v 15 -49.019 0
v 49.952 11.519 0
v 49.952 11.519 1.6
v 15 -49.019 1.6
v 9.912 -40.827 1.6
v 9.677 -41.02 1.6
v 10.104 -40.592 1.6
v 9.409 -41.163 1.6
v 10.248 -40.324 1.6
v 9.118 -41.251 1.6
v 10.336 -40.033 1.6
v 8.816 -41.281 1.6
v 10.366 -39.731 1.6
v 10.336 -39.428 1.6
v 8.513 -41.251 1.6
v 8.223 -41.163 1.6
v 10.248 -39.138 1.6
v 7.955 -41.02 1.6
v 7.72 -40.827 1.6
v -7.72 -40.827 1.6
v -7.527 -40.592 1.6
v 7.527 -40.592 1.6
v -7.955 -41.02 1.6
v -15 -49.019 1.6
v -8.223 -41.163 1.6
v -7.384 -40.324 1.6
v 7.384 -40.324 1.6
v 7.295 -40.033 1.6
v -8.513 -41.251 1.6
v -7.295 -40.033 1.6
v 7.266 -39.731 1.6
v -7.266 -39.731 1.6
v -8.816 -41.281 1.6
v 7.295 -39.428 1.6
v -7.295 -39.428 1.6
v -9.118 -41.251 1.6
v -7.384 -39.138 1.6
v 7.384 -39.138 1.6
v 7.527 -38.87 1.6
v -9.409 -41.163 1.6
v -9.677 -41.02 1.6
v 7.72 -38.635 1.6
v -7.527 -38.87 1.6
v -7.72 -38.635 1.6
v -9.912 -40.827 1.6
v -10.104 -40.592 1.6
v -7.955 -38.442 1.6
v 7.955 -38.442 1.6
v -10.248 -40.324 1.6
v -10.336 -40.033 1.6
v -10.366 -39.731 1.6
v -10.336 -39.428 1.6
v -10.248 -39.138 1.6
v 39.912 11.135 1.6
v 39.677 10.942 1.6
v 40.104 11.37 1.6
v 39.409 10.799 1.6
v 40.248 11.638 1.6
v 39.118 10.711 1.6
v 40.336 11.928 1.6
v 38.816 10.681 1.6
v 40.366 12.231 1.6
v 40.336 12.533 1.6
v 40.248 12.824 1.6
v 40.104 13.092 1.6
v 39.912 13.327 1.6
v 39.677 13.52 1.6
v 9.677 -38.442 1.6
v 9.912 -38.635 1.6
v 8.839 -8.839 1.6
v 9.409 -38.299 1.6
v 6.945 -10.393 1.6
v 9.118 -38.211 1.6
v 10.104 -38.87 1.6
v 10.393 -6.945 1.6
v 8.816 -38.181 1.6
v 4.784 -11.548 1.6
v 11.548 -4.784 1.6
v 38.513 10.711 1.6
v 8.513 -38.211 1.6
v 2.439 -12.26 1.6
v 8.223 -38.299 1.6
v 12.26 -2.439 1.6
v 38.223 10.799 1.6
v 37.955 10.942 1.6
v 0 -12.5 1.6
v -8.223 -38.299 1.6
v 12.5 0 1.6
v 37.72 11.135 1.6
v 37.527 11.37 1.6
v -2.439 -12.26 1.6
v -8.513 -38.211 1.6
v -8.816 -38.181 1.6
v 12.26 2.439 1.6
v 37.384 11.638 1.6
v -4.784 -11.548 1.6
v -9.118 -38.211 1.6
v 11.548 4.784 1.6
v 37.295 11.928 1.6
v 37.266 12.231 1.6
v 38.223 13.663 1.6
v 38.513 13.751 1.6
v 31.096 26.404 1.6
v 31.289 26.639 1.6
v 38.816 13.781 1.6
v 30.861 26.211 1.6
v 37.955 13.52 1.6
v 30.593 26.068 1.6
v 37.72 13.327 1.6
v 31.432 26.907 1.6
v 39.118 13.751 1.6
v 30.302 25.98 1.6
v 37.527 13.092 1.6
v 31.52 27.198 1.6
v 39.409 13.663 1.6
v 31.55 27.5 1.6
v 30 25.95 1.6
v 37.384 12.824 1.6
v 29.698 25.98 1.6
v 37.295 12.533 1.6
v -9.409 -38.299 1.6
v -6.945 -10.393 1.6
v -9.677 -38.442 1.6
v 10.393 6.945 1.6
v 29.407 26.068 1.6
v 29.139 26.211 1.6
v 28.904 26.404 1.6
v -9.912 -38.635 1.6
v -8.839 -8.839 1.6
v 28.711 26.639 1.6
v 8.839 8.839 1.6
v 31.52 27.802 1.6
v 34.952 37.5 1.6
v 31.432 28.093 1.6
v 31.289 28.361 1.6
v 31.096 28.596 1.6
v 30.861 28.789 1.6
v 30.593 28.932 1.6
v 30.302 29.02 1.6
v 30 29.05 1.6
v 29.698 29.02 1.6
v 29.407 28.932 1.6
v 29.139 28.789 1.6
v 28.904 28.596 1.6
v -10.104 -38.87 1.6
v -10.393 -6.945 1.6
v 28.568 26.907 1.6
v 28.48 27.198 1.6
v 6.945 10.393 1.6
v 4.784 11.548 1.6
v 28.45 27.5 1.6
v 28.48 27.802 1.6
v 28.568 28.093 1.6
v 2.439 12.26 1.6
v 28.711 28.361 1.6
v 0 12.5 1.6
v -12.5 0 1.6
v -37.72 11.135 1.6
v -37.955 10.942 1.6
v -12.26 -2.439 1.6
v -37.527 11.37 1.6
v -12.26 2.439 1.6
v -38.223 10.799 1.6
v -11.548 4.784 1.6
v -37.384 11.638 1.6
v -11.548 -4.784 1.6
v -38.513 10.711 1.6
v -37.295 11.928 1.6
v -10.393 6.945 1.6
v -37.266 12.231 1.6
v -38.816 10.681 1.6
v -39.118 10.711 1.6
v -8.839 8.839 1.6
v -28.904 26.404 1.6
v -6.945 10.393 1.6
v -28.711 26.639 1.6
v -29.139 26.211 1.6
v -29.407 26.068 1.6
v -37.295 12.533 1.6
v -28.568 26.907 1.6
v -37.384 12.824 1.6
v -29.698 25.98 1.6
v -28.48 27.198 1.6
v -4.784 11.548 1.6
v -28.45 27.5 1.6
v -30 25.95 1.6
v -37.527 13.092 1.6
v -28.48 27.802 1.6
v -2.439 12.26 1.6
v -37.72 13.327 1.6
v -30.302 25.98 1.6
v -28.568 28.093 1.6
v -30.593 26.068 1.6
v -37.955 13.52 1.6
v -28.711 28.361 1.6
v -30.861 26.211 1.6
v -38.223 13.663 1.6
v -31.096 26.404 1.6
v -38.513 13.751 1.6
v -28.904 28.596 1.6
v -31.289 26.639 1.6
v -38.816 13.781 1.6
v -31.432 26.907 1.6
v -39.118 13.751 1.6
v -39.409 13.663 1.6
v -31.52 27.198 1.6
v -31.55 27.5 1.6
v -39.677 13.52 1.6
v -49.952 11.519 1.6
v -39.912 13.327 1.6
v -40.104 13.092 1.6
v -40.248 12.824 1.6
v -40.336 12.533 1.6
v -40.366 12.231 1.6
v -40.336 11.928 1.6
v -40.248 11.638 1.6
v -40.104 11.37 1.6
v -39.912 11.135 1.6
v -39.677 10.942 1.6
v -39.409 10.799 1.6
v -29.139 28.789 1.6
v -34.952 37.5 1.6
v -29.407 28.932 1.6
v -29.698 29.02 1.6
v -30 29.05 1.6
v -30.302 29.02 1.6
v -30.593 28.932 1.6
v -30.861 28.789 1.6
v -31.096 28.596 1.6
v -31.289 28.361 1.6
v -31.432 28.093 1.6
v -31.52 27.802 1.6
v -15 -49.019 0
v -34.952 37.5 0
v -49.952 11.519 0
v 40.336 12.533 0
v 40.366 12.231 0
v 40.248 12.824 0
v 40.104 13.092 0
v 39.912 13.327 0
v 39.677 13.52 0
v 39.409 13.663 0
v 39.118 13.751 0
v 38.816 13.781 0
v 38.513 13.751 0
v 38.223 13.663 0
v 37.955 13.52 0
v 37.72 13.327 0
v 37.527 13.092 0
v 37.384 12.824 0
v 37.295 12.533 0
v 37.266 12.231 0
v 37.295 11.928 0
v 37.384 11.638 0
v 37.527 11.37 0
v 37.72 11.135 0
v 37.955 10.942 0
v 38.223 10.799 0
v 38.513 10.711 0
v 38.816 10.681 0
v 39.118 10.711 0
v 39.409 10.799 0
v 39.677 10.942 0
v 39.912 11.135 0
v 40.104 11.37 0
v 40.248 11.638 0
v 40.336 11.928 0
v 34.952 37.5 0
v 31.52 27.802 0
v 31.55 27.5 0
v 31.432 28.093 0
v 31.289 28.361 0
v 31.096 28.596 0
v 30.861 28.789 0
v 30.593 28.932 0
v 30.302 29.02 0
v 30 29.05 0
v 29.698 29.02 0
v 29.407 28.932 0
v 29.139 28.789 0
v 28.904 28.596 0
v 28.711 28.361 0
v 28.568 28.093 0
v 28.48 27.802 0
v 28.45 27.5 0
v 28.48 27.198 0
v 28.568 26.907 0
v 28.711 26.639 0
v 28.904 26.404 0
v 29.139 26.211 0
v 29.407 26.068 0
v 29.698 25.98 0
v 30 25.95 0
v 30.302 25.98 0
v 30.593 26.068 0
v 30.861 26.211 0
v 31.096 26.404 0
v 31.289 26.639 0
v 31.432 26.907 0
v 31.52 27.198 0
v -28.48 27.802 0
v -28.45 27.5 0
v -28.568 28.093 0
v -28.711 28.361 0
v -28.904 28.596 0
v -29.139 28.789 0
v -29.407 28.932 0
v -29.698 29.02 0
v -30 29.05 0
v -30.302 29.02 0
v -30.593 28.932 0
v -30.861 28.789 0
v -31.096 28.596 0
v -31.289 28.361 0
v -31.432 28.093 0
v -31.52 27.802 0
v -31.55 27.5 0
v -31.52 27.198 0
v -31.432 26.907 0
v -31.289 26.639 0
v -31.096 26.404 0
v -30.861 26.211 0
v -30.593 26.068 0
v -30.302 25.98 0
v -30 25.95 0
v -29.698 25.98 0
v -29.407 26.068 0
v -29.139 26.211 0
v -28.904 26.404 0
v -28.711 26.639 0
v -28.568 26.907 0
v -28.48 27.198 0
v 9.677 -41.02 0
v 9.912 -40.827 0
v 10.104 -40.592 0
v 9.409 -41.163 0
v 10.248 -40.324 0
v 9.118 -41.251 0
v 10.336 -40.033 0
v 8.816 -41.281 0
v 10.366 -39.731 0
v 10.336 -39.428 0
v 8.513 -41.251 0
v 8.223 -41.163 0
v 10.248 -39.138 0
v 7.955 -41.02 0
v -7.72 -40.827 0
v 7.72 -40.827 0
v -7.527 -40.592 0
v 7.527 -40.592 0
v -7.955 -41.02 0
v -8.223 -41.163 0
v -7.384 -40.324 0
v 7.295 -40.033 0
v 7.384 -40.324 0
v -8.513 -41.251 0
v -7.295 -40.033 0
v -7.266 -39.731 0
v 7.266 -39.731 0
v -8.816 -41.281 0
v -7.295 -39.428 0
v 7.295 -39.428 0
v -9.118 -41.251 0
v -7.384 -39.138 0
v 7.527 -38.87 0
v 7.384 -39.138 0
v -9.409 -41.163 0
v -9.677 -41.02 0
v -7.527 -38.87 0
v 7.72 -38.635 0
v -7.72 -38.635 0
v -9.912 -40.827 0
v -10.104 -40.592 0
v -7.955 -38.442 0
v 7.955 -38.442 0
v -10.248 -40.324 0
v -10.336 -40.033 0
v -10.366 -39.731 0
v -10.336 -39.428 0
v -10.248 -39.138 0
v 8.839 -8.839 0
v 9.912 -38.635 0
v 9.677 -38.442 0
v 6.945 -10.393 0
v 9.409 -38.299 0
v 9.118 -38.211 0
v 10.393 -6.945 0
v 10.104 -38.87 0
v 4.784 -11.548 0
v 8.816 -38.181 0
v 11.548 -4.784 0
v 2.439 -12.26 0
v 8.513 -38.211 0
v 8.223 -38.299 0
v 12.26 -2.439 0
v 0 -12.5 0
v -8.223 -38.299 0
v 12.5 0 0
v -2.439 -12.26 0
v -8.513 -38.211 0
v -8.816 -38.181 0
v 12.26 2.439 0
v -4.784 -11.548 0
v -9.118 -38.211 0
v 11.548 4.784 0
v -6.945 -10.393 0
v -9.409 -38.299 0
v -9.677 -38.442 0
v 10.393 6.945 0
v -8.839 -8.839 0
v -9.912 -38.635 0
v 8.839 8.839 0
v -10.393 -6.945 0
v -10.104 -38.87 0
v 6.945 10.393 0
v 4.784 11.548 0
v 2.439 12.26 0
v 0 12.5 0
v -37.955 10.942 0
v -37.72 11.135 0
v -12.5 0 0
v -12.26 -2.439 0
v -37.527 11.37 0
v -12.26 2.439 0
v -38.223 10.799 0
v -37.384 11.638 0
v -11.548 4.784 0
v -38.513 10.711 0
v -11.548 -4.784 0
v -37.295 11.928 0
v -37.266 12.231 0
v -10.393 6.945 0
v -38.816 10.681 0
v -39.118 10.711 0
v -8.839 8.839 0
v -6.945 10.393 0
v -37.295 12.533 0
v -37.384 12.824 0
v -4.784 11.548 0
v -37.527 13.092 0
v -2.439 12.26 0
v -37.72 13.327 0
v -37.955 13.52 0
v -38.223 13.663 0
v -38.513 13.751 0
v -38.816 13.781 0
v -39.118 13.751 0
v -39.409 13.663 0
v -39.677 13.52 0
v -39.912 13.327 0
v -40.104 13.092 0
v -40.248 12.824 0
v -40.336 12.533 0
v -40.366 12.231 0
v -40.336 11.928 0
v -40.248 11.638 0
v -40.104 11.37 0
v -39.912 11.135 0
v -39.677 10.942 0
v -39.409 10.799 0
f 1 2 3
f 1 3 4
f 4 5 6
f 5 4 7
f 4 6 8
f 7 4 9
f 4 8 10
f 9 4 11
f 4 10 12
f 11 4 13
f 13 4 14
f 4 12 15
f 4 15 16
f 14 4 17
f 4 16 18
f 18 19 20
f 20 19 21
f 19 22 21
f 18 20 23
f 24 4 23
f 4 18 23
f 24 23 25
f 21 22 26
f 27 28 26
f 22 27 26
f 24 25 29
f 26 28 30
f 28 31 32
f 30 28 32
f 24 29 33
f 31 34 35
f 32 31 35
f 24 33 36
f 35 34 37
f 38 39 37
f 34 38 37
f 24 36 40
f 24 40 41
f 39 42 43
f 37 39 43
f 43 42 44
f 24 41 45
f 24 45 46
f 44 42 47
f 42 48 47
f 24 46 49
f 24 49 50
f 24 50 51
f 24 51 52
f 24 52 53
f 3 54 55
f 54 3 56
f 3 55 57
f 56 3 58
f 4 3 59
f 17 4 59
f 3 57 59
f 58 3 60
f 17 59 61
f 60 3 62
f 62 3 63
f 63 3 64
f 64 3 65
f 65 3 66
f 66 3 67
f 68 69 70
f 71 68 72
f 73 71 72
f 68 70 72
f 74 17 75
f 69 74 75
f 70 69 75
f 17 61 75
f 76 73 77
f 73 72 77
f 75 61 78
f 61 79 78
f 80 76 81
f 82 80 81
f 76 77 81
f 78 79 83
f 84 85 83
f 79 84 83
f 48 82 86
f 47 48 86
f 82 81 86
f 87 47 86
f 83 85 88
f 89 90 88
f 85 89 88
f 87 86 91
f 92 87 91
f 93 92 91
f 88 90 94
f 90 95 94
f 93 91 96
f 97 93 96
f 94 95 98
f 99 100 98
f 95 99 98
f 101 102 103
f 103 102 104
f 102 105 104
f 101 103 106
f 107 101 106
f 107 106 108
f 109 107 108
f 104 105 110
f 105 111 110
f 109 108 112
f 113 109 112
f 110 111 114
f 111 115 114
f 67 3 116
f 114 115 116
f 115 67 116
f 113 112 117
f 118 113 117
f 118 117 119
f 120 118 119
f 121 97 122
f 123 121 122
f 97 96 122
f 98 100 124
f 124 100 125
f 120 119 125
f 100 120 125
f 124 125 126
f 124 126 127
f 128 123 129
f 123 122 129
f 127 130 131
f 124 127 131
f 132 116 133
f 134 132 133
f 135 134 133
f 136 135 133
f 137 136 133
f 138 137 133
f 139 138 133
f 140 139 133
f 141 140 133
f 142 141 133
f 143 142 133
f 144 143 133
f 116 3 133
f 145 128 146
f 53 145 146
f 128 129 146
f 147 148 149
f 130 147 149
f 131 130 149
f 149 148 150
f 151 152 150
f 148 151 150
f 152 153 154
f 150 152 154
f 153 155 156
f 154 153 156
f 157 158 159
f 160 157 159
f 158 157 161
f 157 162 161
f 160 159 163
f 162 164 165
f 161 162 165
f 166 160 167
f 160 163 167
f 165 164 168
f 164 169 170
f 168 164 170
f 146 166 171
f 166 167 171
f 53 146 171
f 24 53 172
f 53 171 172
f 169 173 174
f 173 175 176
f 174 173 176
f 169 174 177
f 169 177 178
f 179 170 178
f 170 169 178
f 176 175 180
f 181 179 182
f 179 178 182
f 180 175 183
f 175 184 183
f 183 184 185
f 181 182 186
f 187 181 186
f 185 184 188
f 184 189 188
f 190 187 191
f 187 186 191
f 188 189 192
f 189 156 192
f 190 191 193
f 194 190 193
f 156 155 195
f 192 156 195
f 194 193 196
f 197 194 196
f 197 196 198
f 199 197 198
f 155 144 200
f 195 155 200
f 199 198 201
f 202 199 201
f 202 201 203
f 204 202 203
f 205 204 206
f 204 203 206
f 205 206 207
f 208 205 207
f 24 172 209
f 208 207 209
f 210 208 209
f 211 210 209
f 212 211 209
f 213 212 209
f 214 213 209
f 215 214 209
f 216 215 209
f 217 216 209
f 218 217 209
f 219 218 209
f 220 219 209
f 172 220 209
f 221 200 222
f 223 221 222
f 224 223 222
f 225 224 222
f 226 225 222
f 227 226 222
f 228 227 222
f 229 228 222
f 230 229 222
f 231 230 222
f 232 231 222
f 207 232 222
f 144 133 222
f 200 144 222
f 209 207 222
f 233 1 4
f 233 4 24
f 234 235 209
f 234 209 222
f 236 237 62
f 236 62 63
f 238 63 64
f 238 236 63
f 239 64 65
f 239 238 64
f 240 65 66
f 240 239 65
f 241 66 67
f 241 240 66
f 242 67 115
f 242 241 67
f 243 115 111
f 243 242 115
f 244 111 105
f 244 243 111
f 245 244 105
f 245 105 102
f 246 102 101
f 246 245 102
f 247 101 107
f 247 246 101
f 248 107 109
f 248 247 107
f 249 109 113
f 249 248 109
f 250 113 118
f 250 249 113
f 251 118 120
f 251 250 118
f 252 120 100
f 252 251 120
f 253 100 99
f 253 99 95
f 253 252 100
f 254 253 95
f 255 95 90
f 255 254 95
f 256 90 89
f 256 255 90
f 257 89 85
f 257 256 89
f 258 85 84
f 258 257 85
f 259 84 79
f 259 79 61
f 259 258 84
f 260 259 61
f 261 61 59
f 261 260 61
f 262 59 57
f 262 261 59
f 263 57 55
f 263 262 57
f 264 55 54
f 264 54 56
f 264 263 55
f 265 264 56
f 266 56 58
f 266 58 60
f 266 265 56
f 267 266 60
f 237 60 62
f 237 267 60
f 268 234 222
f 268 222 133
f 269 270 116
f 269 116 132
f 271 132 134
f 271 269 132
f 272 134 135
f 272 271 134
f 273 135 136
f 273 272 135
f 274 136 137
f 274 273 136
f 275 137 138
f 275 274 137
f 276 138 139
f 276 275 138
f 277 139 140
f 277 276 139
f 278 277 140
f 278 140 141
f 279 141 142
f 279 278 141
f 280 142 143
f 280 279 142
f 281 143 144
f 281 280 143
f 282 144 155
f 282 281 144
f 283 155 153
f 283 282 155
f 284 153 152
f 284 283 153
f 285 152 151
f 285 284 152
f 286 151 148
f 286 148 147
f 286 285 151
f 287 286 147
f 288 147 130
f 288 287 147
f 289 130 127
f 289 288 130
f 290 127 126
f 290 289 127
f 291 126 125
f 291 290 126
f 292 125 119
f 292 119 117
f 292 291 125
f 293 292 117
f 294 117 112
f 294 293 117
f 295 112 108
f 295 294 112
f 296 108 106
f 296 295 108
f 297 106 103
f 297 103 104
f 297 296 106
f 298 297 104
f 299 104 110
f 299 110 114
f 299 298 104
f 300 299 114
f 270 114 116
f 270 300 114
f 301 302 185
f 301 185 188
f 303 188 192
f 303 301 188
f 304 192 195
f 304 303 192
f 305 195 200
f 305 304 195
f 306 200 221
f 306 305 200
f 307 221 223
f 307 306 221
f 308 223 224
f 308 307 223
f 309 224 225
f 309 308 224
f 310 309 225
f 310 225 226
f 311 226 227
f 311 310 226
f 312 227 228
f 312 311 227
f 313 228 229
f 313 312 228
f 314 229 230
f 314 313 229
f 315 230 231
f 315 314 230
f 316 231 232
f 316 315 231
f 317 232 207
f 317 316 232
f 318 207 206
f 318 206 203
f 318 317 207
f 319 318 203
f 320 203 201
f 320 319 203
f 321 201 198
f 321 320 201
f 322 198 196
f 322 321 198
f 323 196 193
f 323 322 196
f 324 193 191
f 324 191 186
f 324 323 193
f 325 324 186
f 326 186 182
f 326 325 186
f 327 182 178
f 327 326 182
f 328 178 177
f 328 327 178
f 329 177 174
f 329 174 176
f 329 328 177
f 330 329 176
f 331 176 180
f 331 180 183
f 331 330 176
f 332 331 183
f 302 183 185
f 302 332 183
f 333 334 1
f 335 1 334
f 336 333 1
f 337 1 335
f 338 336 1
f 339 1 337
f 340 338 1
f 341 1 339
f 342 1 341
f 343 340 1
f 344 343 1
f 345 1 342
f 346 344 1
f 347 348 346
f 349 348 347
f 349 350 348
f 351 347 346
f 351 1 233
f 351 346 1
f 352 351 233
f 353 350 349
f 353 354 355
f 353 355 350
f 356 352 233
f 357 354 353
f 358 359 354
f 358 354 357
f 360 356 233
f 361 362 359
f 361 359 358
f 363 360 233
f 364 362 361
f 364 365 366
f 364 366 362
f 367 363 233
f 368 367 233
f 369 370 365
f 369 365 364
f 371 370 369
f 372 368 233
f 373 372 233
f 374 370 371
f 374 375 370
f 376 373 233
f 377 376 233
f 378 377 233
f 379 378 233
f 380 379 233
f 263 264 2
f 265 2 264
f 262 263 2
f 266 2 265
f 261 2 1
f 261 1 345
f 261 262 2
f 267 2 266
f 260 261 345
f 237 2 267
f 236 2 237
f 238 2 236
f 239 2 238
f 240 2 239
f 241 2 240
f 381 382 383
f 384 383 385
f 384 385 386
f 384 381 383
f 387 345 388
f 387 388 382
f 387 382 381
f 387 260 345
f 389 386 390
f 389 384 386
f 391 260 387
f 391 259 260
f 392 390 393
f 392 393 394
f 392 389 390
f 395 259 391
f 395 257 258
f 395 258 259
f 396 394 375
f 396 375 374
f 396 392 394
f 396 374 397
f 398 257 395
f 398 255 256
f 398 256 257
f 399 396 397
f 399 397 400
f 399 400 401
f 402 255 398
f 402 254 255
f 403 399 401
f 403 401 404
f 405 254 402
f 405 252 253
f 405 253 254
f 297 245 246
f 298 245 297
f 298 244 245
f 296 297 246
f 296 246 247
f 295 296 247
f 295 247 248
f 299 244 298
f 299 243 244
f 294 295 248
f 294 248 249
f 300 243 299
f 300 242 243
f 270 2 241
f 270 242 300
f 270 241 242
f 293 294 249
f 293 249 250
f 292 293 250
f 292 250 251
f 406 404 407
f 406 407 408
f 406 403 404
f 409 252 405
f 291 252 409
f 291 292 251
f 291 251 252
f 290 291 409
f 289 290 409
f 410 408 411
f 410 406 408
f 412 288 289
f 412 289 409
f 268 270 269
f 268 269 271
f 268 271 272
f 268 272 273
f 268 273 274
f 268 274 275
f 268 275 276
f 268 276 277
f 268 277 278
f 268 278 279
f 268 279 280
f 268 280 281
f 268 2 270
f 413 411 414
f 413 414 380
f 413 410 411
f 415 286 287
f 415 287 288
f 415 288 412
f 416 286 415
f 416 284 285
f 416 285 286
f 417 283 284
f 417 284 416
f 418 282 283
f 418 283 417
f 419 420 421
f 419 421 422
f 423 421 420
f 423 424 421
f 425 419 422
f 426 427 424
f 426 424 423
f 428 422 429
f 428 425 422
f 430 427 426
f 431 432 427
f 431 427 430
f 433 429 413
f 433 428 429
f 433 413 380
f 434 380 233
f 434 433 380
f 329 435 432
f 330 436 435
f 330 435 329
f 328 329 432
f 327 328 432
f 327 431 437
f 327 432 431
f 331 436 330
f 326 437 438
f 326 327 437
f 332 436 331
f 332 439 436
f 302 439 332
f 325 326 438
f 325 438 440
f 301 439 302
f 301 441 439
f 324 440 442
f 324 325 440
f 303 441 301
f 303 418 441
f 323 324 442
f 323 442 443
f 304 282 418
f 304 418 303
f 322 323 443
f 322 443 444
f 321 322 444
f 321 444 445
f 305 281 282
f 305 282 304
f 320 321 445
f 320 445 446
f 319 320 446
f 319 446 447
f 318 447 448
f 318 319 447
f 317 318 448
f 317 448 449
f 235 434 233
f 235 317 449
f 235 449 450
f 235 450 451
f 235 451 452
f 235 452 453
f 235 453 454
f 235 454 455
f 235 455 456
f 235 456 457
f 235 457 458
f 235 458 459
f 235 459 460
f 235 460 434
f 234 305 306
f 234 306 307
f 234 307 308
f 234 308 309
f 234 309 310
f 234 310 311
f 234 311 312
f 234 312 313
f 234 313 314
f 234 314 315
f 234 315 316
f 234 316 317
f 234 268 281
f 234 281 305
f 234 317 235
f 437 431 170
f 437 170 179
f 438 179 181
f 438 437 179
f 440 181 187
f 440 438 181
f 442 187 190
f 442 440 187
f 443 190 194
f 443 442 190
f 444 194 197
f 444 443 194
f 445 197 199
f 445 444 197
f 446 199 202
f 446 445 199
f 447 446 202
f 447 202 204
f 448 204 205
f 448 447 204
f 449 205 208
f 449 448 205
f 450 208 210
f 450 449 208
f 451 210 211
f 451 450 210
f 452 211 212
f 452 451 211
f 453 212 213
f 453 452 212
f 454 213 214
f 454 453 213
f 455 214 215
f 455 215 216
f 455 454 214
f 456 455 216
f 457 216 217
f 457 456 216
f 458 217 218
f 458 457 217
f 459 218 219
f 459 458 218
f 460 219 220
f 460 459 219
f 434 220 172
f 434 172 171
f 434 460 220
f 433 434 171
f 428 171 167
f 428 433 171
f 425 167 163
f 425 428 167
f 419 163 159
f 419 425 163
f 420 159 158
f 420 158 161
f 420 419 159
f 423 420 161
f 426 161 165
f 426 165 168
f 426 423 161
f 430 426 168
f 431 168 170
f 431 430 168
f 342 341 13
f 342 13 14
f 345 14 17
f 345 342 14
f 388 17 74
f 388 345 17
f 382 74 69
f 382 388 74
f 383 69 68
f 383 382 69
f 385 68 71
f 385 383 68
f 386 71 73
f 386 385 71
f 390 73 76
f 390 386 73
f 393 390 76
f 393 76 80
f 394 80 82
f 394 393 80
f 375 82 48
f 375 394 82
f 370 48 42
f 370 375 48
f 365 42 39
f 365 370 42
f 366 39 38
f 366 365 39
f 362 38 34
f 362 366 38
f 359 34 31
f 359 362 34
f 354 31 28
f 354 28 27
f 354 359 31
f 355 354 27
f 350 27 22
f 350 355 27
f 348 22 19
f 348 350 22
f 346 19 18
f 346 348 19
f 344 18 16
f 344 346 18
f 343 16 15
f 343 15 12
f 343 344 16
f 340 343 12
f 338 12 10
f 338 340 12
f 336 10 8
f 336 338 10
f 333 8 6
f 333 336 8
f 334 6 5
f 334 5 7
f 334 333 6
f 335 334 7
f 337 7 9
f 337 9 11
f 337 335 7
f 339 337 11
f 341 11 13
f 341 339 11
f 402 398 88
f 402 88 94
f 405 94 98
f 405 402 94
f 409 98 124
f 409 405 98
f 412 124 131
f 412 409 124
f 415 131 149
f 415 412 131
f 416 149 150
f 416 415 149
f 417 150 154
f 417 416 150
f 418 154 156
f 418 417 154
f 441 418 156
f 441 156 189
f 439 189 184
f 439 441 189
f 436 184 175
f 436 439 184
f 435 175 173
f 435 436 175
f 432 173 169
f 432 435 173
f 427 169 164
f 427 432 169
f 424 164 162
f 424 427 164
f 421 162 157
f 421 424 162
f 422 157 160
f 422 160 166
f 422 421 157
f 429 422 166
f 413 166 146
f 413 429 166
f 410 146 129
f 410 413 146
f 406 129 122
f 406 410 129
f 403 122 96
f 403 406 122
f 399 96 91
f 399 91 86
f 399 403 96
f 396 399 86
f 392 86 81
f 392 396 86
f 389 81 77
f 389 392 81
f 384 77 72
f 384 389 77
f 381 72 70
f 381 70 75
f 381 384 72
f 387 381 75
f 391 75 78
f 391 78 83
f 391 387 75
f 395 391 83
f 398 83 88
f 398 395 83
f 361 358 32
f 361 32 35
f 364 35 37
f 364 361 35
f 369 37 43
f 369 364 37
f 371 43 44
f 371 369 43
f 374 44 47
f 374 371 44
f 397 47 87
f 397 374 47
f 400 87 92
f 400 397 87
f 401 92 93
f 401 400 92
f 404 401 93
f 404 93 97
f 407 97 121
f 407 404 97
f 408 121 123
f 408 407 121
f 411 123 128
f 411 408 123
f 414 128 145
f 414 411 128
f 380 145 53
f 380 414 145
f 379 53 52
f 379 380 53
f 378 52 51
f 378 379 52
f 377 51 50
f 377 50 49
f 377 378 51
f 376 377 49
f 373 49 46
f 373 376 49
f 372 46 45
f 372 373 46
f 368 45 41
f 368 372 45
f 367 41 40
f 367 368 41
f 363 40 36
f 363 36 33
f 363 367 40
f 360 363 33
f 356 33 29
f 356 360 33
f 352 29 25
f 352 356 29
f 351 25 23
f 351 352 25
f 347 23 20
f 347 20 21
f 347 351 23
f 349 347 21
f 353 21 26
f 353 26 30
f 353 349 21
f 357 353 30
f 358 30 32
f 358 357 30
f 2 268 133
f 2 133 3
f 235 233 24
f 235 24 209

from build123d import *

# Parameters (mm, degrees)
SKETCH1_R           = 1.55
SKETCH1_R_2         = 12.5
BOSS_EXTRUDE1_DEPTH = 1.6


with BuildPart() as part:
    # Sketch1 → Boss-Extrude1 (new body)
    with BuildSketch(Plane.XY):
        Polygon((-34.951905284, 37.5), (34.951905284, 37.5), (49.951905284, 11.519237886), (15, -49.019237886), (-15, -49.019237886), (-49.951905284, 11.519237886), align=None)
        with Locations((-30, 27.5)):
            Circle(SKETCH1_R, mode=Mode.SUBTRACT)
        with Locations((30, 27.5)):
            Circle(SKETCH1_R, mode=Mode.SUBTRACT)
        with Locations((38.815698604, 12.230762114)):
            Circle(SKETCH1_R, mode=Mode.SUBTRACT)
        with Locations((8.815698604, -39.730762114)):
            Circle(SKETCH1_R, mode=Mode.SUBTRACT)
        with Locations((-8.815698604, -39.730762114)):
            Circle(SKETCH1_R, mode=Mode.SUBTRACT)
        with Locations((-38.815698604, 12.230762114)):
            Circle(SKETCH1_R, mode=Mode.SUBTRACT)
        Circle(SKETCH1_R_2, mode=Mode.SUBTRACT)
    extrude(amount=BOSS_EXTRUDE1_DEPTH)


solid = part.part
